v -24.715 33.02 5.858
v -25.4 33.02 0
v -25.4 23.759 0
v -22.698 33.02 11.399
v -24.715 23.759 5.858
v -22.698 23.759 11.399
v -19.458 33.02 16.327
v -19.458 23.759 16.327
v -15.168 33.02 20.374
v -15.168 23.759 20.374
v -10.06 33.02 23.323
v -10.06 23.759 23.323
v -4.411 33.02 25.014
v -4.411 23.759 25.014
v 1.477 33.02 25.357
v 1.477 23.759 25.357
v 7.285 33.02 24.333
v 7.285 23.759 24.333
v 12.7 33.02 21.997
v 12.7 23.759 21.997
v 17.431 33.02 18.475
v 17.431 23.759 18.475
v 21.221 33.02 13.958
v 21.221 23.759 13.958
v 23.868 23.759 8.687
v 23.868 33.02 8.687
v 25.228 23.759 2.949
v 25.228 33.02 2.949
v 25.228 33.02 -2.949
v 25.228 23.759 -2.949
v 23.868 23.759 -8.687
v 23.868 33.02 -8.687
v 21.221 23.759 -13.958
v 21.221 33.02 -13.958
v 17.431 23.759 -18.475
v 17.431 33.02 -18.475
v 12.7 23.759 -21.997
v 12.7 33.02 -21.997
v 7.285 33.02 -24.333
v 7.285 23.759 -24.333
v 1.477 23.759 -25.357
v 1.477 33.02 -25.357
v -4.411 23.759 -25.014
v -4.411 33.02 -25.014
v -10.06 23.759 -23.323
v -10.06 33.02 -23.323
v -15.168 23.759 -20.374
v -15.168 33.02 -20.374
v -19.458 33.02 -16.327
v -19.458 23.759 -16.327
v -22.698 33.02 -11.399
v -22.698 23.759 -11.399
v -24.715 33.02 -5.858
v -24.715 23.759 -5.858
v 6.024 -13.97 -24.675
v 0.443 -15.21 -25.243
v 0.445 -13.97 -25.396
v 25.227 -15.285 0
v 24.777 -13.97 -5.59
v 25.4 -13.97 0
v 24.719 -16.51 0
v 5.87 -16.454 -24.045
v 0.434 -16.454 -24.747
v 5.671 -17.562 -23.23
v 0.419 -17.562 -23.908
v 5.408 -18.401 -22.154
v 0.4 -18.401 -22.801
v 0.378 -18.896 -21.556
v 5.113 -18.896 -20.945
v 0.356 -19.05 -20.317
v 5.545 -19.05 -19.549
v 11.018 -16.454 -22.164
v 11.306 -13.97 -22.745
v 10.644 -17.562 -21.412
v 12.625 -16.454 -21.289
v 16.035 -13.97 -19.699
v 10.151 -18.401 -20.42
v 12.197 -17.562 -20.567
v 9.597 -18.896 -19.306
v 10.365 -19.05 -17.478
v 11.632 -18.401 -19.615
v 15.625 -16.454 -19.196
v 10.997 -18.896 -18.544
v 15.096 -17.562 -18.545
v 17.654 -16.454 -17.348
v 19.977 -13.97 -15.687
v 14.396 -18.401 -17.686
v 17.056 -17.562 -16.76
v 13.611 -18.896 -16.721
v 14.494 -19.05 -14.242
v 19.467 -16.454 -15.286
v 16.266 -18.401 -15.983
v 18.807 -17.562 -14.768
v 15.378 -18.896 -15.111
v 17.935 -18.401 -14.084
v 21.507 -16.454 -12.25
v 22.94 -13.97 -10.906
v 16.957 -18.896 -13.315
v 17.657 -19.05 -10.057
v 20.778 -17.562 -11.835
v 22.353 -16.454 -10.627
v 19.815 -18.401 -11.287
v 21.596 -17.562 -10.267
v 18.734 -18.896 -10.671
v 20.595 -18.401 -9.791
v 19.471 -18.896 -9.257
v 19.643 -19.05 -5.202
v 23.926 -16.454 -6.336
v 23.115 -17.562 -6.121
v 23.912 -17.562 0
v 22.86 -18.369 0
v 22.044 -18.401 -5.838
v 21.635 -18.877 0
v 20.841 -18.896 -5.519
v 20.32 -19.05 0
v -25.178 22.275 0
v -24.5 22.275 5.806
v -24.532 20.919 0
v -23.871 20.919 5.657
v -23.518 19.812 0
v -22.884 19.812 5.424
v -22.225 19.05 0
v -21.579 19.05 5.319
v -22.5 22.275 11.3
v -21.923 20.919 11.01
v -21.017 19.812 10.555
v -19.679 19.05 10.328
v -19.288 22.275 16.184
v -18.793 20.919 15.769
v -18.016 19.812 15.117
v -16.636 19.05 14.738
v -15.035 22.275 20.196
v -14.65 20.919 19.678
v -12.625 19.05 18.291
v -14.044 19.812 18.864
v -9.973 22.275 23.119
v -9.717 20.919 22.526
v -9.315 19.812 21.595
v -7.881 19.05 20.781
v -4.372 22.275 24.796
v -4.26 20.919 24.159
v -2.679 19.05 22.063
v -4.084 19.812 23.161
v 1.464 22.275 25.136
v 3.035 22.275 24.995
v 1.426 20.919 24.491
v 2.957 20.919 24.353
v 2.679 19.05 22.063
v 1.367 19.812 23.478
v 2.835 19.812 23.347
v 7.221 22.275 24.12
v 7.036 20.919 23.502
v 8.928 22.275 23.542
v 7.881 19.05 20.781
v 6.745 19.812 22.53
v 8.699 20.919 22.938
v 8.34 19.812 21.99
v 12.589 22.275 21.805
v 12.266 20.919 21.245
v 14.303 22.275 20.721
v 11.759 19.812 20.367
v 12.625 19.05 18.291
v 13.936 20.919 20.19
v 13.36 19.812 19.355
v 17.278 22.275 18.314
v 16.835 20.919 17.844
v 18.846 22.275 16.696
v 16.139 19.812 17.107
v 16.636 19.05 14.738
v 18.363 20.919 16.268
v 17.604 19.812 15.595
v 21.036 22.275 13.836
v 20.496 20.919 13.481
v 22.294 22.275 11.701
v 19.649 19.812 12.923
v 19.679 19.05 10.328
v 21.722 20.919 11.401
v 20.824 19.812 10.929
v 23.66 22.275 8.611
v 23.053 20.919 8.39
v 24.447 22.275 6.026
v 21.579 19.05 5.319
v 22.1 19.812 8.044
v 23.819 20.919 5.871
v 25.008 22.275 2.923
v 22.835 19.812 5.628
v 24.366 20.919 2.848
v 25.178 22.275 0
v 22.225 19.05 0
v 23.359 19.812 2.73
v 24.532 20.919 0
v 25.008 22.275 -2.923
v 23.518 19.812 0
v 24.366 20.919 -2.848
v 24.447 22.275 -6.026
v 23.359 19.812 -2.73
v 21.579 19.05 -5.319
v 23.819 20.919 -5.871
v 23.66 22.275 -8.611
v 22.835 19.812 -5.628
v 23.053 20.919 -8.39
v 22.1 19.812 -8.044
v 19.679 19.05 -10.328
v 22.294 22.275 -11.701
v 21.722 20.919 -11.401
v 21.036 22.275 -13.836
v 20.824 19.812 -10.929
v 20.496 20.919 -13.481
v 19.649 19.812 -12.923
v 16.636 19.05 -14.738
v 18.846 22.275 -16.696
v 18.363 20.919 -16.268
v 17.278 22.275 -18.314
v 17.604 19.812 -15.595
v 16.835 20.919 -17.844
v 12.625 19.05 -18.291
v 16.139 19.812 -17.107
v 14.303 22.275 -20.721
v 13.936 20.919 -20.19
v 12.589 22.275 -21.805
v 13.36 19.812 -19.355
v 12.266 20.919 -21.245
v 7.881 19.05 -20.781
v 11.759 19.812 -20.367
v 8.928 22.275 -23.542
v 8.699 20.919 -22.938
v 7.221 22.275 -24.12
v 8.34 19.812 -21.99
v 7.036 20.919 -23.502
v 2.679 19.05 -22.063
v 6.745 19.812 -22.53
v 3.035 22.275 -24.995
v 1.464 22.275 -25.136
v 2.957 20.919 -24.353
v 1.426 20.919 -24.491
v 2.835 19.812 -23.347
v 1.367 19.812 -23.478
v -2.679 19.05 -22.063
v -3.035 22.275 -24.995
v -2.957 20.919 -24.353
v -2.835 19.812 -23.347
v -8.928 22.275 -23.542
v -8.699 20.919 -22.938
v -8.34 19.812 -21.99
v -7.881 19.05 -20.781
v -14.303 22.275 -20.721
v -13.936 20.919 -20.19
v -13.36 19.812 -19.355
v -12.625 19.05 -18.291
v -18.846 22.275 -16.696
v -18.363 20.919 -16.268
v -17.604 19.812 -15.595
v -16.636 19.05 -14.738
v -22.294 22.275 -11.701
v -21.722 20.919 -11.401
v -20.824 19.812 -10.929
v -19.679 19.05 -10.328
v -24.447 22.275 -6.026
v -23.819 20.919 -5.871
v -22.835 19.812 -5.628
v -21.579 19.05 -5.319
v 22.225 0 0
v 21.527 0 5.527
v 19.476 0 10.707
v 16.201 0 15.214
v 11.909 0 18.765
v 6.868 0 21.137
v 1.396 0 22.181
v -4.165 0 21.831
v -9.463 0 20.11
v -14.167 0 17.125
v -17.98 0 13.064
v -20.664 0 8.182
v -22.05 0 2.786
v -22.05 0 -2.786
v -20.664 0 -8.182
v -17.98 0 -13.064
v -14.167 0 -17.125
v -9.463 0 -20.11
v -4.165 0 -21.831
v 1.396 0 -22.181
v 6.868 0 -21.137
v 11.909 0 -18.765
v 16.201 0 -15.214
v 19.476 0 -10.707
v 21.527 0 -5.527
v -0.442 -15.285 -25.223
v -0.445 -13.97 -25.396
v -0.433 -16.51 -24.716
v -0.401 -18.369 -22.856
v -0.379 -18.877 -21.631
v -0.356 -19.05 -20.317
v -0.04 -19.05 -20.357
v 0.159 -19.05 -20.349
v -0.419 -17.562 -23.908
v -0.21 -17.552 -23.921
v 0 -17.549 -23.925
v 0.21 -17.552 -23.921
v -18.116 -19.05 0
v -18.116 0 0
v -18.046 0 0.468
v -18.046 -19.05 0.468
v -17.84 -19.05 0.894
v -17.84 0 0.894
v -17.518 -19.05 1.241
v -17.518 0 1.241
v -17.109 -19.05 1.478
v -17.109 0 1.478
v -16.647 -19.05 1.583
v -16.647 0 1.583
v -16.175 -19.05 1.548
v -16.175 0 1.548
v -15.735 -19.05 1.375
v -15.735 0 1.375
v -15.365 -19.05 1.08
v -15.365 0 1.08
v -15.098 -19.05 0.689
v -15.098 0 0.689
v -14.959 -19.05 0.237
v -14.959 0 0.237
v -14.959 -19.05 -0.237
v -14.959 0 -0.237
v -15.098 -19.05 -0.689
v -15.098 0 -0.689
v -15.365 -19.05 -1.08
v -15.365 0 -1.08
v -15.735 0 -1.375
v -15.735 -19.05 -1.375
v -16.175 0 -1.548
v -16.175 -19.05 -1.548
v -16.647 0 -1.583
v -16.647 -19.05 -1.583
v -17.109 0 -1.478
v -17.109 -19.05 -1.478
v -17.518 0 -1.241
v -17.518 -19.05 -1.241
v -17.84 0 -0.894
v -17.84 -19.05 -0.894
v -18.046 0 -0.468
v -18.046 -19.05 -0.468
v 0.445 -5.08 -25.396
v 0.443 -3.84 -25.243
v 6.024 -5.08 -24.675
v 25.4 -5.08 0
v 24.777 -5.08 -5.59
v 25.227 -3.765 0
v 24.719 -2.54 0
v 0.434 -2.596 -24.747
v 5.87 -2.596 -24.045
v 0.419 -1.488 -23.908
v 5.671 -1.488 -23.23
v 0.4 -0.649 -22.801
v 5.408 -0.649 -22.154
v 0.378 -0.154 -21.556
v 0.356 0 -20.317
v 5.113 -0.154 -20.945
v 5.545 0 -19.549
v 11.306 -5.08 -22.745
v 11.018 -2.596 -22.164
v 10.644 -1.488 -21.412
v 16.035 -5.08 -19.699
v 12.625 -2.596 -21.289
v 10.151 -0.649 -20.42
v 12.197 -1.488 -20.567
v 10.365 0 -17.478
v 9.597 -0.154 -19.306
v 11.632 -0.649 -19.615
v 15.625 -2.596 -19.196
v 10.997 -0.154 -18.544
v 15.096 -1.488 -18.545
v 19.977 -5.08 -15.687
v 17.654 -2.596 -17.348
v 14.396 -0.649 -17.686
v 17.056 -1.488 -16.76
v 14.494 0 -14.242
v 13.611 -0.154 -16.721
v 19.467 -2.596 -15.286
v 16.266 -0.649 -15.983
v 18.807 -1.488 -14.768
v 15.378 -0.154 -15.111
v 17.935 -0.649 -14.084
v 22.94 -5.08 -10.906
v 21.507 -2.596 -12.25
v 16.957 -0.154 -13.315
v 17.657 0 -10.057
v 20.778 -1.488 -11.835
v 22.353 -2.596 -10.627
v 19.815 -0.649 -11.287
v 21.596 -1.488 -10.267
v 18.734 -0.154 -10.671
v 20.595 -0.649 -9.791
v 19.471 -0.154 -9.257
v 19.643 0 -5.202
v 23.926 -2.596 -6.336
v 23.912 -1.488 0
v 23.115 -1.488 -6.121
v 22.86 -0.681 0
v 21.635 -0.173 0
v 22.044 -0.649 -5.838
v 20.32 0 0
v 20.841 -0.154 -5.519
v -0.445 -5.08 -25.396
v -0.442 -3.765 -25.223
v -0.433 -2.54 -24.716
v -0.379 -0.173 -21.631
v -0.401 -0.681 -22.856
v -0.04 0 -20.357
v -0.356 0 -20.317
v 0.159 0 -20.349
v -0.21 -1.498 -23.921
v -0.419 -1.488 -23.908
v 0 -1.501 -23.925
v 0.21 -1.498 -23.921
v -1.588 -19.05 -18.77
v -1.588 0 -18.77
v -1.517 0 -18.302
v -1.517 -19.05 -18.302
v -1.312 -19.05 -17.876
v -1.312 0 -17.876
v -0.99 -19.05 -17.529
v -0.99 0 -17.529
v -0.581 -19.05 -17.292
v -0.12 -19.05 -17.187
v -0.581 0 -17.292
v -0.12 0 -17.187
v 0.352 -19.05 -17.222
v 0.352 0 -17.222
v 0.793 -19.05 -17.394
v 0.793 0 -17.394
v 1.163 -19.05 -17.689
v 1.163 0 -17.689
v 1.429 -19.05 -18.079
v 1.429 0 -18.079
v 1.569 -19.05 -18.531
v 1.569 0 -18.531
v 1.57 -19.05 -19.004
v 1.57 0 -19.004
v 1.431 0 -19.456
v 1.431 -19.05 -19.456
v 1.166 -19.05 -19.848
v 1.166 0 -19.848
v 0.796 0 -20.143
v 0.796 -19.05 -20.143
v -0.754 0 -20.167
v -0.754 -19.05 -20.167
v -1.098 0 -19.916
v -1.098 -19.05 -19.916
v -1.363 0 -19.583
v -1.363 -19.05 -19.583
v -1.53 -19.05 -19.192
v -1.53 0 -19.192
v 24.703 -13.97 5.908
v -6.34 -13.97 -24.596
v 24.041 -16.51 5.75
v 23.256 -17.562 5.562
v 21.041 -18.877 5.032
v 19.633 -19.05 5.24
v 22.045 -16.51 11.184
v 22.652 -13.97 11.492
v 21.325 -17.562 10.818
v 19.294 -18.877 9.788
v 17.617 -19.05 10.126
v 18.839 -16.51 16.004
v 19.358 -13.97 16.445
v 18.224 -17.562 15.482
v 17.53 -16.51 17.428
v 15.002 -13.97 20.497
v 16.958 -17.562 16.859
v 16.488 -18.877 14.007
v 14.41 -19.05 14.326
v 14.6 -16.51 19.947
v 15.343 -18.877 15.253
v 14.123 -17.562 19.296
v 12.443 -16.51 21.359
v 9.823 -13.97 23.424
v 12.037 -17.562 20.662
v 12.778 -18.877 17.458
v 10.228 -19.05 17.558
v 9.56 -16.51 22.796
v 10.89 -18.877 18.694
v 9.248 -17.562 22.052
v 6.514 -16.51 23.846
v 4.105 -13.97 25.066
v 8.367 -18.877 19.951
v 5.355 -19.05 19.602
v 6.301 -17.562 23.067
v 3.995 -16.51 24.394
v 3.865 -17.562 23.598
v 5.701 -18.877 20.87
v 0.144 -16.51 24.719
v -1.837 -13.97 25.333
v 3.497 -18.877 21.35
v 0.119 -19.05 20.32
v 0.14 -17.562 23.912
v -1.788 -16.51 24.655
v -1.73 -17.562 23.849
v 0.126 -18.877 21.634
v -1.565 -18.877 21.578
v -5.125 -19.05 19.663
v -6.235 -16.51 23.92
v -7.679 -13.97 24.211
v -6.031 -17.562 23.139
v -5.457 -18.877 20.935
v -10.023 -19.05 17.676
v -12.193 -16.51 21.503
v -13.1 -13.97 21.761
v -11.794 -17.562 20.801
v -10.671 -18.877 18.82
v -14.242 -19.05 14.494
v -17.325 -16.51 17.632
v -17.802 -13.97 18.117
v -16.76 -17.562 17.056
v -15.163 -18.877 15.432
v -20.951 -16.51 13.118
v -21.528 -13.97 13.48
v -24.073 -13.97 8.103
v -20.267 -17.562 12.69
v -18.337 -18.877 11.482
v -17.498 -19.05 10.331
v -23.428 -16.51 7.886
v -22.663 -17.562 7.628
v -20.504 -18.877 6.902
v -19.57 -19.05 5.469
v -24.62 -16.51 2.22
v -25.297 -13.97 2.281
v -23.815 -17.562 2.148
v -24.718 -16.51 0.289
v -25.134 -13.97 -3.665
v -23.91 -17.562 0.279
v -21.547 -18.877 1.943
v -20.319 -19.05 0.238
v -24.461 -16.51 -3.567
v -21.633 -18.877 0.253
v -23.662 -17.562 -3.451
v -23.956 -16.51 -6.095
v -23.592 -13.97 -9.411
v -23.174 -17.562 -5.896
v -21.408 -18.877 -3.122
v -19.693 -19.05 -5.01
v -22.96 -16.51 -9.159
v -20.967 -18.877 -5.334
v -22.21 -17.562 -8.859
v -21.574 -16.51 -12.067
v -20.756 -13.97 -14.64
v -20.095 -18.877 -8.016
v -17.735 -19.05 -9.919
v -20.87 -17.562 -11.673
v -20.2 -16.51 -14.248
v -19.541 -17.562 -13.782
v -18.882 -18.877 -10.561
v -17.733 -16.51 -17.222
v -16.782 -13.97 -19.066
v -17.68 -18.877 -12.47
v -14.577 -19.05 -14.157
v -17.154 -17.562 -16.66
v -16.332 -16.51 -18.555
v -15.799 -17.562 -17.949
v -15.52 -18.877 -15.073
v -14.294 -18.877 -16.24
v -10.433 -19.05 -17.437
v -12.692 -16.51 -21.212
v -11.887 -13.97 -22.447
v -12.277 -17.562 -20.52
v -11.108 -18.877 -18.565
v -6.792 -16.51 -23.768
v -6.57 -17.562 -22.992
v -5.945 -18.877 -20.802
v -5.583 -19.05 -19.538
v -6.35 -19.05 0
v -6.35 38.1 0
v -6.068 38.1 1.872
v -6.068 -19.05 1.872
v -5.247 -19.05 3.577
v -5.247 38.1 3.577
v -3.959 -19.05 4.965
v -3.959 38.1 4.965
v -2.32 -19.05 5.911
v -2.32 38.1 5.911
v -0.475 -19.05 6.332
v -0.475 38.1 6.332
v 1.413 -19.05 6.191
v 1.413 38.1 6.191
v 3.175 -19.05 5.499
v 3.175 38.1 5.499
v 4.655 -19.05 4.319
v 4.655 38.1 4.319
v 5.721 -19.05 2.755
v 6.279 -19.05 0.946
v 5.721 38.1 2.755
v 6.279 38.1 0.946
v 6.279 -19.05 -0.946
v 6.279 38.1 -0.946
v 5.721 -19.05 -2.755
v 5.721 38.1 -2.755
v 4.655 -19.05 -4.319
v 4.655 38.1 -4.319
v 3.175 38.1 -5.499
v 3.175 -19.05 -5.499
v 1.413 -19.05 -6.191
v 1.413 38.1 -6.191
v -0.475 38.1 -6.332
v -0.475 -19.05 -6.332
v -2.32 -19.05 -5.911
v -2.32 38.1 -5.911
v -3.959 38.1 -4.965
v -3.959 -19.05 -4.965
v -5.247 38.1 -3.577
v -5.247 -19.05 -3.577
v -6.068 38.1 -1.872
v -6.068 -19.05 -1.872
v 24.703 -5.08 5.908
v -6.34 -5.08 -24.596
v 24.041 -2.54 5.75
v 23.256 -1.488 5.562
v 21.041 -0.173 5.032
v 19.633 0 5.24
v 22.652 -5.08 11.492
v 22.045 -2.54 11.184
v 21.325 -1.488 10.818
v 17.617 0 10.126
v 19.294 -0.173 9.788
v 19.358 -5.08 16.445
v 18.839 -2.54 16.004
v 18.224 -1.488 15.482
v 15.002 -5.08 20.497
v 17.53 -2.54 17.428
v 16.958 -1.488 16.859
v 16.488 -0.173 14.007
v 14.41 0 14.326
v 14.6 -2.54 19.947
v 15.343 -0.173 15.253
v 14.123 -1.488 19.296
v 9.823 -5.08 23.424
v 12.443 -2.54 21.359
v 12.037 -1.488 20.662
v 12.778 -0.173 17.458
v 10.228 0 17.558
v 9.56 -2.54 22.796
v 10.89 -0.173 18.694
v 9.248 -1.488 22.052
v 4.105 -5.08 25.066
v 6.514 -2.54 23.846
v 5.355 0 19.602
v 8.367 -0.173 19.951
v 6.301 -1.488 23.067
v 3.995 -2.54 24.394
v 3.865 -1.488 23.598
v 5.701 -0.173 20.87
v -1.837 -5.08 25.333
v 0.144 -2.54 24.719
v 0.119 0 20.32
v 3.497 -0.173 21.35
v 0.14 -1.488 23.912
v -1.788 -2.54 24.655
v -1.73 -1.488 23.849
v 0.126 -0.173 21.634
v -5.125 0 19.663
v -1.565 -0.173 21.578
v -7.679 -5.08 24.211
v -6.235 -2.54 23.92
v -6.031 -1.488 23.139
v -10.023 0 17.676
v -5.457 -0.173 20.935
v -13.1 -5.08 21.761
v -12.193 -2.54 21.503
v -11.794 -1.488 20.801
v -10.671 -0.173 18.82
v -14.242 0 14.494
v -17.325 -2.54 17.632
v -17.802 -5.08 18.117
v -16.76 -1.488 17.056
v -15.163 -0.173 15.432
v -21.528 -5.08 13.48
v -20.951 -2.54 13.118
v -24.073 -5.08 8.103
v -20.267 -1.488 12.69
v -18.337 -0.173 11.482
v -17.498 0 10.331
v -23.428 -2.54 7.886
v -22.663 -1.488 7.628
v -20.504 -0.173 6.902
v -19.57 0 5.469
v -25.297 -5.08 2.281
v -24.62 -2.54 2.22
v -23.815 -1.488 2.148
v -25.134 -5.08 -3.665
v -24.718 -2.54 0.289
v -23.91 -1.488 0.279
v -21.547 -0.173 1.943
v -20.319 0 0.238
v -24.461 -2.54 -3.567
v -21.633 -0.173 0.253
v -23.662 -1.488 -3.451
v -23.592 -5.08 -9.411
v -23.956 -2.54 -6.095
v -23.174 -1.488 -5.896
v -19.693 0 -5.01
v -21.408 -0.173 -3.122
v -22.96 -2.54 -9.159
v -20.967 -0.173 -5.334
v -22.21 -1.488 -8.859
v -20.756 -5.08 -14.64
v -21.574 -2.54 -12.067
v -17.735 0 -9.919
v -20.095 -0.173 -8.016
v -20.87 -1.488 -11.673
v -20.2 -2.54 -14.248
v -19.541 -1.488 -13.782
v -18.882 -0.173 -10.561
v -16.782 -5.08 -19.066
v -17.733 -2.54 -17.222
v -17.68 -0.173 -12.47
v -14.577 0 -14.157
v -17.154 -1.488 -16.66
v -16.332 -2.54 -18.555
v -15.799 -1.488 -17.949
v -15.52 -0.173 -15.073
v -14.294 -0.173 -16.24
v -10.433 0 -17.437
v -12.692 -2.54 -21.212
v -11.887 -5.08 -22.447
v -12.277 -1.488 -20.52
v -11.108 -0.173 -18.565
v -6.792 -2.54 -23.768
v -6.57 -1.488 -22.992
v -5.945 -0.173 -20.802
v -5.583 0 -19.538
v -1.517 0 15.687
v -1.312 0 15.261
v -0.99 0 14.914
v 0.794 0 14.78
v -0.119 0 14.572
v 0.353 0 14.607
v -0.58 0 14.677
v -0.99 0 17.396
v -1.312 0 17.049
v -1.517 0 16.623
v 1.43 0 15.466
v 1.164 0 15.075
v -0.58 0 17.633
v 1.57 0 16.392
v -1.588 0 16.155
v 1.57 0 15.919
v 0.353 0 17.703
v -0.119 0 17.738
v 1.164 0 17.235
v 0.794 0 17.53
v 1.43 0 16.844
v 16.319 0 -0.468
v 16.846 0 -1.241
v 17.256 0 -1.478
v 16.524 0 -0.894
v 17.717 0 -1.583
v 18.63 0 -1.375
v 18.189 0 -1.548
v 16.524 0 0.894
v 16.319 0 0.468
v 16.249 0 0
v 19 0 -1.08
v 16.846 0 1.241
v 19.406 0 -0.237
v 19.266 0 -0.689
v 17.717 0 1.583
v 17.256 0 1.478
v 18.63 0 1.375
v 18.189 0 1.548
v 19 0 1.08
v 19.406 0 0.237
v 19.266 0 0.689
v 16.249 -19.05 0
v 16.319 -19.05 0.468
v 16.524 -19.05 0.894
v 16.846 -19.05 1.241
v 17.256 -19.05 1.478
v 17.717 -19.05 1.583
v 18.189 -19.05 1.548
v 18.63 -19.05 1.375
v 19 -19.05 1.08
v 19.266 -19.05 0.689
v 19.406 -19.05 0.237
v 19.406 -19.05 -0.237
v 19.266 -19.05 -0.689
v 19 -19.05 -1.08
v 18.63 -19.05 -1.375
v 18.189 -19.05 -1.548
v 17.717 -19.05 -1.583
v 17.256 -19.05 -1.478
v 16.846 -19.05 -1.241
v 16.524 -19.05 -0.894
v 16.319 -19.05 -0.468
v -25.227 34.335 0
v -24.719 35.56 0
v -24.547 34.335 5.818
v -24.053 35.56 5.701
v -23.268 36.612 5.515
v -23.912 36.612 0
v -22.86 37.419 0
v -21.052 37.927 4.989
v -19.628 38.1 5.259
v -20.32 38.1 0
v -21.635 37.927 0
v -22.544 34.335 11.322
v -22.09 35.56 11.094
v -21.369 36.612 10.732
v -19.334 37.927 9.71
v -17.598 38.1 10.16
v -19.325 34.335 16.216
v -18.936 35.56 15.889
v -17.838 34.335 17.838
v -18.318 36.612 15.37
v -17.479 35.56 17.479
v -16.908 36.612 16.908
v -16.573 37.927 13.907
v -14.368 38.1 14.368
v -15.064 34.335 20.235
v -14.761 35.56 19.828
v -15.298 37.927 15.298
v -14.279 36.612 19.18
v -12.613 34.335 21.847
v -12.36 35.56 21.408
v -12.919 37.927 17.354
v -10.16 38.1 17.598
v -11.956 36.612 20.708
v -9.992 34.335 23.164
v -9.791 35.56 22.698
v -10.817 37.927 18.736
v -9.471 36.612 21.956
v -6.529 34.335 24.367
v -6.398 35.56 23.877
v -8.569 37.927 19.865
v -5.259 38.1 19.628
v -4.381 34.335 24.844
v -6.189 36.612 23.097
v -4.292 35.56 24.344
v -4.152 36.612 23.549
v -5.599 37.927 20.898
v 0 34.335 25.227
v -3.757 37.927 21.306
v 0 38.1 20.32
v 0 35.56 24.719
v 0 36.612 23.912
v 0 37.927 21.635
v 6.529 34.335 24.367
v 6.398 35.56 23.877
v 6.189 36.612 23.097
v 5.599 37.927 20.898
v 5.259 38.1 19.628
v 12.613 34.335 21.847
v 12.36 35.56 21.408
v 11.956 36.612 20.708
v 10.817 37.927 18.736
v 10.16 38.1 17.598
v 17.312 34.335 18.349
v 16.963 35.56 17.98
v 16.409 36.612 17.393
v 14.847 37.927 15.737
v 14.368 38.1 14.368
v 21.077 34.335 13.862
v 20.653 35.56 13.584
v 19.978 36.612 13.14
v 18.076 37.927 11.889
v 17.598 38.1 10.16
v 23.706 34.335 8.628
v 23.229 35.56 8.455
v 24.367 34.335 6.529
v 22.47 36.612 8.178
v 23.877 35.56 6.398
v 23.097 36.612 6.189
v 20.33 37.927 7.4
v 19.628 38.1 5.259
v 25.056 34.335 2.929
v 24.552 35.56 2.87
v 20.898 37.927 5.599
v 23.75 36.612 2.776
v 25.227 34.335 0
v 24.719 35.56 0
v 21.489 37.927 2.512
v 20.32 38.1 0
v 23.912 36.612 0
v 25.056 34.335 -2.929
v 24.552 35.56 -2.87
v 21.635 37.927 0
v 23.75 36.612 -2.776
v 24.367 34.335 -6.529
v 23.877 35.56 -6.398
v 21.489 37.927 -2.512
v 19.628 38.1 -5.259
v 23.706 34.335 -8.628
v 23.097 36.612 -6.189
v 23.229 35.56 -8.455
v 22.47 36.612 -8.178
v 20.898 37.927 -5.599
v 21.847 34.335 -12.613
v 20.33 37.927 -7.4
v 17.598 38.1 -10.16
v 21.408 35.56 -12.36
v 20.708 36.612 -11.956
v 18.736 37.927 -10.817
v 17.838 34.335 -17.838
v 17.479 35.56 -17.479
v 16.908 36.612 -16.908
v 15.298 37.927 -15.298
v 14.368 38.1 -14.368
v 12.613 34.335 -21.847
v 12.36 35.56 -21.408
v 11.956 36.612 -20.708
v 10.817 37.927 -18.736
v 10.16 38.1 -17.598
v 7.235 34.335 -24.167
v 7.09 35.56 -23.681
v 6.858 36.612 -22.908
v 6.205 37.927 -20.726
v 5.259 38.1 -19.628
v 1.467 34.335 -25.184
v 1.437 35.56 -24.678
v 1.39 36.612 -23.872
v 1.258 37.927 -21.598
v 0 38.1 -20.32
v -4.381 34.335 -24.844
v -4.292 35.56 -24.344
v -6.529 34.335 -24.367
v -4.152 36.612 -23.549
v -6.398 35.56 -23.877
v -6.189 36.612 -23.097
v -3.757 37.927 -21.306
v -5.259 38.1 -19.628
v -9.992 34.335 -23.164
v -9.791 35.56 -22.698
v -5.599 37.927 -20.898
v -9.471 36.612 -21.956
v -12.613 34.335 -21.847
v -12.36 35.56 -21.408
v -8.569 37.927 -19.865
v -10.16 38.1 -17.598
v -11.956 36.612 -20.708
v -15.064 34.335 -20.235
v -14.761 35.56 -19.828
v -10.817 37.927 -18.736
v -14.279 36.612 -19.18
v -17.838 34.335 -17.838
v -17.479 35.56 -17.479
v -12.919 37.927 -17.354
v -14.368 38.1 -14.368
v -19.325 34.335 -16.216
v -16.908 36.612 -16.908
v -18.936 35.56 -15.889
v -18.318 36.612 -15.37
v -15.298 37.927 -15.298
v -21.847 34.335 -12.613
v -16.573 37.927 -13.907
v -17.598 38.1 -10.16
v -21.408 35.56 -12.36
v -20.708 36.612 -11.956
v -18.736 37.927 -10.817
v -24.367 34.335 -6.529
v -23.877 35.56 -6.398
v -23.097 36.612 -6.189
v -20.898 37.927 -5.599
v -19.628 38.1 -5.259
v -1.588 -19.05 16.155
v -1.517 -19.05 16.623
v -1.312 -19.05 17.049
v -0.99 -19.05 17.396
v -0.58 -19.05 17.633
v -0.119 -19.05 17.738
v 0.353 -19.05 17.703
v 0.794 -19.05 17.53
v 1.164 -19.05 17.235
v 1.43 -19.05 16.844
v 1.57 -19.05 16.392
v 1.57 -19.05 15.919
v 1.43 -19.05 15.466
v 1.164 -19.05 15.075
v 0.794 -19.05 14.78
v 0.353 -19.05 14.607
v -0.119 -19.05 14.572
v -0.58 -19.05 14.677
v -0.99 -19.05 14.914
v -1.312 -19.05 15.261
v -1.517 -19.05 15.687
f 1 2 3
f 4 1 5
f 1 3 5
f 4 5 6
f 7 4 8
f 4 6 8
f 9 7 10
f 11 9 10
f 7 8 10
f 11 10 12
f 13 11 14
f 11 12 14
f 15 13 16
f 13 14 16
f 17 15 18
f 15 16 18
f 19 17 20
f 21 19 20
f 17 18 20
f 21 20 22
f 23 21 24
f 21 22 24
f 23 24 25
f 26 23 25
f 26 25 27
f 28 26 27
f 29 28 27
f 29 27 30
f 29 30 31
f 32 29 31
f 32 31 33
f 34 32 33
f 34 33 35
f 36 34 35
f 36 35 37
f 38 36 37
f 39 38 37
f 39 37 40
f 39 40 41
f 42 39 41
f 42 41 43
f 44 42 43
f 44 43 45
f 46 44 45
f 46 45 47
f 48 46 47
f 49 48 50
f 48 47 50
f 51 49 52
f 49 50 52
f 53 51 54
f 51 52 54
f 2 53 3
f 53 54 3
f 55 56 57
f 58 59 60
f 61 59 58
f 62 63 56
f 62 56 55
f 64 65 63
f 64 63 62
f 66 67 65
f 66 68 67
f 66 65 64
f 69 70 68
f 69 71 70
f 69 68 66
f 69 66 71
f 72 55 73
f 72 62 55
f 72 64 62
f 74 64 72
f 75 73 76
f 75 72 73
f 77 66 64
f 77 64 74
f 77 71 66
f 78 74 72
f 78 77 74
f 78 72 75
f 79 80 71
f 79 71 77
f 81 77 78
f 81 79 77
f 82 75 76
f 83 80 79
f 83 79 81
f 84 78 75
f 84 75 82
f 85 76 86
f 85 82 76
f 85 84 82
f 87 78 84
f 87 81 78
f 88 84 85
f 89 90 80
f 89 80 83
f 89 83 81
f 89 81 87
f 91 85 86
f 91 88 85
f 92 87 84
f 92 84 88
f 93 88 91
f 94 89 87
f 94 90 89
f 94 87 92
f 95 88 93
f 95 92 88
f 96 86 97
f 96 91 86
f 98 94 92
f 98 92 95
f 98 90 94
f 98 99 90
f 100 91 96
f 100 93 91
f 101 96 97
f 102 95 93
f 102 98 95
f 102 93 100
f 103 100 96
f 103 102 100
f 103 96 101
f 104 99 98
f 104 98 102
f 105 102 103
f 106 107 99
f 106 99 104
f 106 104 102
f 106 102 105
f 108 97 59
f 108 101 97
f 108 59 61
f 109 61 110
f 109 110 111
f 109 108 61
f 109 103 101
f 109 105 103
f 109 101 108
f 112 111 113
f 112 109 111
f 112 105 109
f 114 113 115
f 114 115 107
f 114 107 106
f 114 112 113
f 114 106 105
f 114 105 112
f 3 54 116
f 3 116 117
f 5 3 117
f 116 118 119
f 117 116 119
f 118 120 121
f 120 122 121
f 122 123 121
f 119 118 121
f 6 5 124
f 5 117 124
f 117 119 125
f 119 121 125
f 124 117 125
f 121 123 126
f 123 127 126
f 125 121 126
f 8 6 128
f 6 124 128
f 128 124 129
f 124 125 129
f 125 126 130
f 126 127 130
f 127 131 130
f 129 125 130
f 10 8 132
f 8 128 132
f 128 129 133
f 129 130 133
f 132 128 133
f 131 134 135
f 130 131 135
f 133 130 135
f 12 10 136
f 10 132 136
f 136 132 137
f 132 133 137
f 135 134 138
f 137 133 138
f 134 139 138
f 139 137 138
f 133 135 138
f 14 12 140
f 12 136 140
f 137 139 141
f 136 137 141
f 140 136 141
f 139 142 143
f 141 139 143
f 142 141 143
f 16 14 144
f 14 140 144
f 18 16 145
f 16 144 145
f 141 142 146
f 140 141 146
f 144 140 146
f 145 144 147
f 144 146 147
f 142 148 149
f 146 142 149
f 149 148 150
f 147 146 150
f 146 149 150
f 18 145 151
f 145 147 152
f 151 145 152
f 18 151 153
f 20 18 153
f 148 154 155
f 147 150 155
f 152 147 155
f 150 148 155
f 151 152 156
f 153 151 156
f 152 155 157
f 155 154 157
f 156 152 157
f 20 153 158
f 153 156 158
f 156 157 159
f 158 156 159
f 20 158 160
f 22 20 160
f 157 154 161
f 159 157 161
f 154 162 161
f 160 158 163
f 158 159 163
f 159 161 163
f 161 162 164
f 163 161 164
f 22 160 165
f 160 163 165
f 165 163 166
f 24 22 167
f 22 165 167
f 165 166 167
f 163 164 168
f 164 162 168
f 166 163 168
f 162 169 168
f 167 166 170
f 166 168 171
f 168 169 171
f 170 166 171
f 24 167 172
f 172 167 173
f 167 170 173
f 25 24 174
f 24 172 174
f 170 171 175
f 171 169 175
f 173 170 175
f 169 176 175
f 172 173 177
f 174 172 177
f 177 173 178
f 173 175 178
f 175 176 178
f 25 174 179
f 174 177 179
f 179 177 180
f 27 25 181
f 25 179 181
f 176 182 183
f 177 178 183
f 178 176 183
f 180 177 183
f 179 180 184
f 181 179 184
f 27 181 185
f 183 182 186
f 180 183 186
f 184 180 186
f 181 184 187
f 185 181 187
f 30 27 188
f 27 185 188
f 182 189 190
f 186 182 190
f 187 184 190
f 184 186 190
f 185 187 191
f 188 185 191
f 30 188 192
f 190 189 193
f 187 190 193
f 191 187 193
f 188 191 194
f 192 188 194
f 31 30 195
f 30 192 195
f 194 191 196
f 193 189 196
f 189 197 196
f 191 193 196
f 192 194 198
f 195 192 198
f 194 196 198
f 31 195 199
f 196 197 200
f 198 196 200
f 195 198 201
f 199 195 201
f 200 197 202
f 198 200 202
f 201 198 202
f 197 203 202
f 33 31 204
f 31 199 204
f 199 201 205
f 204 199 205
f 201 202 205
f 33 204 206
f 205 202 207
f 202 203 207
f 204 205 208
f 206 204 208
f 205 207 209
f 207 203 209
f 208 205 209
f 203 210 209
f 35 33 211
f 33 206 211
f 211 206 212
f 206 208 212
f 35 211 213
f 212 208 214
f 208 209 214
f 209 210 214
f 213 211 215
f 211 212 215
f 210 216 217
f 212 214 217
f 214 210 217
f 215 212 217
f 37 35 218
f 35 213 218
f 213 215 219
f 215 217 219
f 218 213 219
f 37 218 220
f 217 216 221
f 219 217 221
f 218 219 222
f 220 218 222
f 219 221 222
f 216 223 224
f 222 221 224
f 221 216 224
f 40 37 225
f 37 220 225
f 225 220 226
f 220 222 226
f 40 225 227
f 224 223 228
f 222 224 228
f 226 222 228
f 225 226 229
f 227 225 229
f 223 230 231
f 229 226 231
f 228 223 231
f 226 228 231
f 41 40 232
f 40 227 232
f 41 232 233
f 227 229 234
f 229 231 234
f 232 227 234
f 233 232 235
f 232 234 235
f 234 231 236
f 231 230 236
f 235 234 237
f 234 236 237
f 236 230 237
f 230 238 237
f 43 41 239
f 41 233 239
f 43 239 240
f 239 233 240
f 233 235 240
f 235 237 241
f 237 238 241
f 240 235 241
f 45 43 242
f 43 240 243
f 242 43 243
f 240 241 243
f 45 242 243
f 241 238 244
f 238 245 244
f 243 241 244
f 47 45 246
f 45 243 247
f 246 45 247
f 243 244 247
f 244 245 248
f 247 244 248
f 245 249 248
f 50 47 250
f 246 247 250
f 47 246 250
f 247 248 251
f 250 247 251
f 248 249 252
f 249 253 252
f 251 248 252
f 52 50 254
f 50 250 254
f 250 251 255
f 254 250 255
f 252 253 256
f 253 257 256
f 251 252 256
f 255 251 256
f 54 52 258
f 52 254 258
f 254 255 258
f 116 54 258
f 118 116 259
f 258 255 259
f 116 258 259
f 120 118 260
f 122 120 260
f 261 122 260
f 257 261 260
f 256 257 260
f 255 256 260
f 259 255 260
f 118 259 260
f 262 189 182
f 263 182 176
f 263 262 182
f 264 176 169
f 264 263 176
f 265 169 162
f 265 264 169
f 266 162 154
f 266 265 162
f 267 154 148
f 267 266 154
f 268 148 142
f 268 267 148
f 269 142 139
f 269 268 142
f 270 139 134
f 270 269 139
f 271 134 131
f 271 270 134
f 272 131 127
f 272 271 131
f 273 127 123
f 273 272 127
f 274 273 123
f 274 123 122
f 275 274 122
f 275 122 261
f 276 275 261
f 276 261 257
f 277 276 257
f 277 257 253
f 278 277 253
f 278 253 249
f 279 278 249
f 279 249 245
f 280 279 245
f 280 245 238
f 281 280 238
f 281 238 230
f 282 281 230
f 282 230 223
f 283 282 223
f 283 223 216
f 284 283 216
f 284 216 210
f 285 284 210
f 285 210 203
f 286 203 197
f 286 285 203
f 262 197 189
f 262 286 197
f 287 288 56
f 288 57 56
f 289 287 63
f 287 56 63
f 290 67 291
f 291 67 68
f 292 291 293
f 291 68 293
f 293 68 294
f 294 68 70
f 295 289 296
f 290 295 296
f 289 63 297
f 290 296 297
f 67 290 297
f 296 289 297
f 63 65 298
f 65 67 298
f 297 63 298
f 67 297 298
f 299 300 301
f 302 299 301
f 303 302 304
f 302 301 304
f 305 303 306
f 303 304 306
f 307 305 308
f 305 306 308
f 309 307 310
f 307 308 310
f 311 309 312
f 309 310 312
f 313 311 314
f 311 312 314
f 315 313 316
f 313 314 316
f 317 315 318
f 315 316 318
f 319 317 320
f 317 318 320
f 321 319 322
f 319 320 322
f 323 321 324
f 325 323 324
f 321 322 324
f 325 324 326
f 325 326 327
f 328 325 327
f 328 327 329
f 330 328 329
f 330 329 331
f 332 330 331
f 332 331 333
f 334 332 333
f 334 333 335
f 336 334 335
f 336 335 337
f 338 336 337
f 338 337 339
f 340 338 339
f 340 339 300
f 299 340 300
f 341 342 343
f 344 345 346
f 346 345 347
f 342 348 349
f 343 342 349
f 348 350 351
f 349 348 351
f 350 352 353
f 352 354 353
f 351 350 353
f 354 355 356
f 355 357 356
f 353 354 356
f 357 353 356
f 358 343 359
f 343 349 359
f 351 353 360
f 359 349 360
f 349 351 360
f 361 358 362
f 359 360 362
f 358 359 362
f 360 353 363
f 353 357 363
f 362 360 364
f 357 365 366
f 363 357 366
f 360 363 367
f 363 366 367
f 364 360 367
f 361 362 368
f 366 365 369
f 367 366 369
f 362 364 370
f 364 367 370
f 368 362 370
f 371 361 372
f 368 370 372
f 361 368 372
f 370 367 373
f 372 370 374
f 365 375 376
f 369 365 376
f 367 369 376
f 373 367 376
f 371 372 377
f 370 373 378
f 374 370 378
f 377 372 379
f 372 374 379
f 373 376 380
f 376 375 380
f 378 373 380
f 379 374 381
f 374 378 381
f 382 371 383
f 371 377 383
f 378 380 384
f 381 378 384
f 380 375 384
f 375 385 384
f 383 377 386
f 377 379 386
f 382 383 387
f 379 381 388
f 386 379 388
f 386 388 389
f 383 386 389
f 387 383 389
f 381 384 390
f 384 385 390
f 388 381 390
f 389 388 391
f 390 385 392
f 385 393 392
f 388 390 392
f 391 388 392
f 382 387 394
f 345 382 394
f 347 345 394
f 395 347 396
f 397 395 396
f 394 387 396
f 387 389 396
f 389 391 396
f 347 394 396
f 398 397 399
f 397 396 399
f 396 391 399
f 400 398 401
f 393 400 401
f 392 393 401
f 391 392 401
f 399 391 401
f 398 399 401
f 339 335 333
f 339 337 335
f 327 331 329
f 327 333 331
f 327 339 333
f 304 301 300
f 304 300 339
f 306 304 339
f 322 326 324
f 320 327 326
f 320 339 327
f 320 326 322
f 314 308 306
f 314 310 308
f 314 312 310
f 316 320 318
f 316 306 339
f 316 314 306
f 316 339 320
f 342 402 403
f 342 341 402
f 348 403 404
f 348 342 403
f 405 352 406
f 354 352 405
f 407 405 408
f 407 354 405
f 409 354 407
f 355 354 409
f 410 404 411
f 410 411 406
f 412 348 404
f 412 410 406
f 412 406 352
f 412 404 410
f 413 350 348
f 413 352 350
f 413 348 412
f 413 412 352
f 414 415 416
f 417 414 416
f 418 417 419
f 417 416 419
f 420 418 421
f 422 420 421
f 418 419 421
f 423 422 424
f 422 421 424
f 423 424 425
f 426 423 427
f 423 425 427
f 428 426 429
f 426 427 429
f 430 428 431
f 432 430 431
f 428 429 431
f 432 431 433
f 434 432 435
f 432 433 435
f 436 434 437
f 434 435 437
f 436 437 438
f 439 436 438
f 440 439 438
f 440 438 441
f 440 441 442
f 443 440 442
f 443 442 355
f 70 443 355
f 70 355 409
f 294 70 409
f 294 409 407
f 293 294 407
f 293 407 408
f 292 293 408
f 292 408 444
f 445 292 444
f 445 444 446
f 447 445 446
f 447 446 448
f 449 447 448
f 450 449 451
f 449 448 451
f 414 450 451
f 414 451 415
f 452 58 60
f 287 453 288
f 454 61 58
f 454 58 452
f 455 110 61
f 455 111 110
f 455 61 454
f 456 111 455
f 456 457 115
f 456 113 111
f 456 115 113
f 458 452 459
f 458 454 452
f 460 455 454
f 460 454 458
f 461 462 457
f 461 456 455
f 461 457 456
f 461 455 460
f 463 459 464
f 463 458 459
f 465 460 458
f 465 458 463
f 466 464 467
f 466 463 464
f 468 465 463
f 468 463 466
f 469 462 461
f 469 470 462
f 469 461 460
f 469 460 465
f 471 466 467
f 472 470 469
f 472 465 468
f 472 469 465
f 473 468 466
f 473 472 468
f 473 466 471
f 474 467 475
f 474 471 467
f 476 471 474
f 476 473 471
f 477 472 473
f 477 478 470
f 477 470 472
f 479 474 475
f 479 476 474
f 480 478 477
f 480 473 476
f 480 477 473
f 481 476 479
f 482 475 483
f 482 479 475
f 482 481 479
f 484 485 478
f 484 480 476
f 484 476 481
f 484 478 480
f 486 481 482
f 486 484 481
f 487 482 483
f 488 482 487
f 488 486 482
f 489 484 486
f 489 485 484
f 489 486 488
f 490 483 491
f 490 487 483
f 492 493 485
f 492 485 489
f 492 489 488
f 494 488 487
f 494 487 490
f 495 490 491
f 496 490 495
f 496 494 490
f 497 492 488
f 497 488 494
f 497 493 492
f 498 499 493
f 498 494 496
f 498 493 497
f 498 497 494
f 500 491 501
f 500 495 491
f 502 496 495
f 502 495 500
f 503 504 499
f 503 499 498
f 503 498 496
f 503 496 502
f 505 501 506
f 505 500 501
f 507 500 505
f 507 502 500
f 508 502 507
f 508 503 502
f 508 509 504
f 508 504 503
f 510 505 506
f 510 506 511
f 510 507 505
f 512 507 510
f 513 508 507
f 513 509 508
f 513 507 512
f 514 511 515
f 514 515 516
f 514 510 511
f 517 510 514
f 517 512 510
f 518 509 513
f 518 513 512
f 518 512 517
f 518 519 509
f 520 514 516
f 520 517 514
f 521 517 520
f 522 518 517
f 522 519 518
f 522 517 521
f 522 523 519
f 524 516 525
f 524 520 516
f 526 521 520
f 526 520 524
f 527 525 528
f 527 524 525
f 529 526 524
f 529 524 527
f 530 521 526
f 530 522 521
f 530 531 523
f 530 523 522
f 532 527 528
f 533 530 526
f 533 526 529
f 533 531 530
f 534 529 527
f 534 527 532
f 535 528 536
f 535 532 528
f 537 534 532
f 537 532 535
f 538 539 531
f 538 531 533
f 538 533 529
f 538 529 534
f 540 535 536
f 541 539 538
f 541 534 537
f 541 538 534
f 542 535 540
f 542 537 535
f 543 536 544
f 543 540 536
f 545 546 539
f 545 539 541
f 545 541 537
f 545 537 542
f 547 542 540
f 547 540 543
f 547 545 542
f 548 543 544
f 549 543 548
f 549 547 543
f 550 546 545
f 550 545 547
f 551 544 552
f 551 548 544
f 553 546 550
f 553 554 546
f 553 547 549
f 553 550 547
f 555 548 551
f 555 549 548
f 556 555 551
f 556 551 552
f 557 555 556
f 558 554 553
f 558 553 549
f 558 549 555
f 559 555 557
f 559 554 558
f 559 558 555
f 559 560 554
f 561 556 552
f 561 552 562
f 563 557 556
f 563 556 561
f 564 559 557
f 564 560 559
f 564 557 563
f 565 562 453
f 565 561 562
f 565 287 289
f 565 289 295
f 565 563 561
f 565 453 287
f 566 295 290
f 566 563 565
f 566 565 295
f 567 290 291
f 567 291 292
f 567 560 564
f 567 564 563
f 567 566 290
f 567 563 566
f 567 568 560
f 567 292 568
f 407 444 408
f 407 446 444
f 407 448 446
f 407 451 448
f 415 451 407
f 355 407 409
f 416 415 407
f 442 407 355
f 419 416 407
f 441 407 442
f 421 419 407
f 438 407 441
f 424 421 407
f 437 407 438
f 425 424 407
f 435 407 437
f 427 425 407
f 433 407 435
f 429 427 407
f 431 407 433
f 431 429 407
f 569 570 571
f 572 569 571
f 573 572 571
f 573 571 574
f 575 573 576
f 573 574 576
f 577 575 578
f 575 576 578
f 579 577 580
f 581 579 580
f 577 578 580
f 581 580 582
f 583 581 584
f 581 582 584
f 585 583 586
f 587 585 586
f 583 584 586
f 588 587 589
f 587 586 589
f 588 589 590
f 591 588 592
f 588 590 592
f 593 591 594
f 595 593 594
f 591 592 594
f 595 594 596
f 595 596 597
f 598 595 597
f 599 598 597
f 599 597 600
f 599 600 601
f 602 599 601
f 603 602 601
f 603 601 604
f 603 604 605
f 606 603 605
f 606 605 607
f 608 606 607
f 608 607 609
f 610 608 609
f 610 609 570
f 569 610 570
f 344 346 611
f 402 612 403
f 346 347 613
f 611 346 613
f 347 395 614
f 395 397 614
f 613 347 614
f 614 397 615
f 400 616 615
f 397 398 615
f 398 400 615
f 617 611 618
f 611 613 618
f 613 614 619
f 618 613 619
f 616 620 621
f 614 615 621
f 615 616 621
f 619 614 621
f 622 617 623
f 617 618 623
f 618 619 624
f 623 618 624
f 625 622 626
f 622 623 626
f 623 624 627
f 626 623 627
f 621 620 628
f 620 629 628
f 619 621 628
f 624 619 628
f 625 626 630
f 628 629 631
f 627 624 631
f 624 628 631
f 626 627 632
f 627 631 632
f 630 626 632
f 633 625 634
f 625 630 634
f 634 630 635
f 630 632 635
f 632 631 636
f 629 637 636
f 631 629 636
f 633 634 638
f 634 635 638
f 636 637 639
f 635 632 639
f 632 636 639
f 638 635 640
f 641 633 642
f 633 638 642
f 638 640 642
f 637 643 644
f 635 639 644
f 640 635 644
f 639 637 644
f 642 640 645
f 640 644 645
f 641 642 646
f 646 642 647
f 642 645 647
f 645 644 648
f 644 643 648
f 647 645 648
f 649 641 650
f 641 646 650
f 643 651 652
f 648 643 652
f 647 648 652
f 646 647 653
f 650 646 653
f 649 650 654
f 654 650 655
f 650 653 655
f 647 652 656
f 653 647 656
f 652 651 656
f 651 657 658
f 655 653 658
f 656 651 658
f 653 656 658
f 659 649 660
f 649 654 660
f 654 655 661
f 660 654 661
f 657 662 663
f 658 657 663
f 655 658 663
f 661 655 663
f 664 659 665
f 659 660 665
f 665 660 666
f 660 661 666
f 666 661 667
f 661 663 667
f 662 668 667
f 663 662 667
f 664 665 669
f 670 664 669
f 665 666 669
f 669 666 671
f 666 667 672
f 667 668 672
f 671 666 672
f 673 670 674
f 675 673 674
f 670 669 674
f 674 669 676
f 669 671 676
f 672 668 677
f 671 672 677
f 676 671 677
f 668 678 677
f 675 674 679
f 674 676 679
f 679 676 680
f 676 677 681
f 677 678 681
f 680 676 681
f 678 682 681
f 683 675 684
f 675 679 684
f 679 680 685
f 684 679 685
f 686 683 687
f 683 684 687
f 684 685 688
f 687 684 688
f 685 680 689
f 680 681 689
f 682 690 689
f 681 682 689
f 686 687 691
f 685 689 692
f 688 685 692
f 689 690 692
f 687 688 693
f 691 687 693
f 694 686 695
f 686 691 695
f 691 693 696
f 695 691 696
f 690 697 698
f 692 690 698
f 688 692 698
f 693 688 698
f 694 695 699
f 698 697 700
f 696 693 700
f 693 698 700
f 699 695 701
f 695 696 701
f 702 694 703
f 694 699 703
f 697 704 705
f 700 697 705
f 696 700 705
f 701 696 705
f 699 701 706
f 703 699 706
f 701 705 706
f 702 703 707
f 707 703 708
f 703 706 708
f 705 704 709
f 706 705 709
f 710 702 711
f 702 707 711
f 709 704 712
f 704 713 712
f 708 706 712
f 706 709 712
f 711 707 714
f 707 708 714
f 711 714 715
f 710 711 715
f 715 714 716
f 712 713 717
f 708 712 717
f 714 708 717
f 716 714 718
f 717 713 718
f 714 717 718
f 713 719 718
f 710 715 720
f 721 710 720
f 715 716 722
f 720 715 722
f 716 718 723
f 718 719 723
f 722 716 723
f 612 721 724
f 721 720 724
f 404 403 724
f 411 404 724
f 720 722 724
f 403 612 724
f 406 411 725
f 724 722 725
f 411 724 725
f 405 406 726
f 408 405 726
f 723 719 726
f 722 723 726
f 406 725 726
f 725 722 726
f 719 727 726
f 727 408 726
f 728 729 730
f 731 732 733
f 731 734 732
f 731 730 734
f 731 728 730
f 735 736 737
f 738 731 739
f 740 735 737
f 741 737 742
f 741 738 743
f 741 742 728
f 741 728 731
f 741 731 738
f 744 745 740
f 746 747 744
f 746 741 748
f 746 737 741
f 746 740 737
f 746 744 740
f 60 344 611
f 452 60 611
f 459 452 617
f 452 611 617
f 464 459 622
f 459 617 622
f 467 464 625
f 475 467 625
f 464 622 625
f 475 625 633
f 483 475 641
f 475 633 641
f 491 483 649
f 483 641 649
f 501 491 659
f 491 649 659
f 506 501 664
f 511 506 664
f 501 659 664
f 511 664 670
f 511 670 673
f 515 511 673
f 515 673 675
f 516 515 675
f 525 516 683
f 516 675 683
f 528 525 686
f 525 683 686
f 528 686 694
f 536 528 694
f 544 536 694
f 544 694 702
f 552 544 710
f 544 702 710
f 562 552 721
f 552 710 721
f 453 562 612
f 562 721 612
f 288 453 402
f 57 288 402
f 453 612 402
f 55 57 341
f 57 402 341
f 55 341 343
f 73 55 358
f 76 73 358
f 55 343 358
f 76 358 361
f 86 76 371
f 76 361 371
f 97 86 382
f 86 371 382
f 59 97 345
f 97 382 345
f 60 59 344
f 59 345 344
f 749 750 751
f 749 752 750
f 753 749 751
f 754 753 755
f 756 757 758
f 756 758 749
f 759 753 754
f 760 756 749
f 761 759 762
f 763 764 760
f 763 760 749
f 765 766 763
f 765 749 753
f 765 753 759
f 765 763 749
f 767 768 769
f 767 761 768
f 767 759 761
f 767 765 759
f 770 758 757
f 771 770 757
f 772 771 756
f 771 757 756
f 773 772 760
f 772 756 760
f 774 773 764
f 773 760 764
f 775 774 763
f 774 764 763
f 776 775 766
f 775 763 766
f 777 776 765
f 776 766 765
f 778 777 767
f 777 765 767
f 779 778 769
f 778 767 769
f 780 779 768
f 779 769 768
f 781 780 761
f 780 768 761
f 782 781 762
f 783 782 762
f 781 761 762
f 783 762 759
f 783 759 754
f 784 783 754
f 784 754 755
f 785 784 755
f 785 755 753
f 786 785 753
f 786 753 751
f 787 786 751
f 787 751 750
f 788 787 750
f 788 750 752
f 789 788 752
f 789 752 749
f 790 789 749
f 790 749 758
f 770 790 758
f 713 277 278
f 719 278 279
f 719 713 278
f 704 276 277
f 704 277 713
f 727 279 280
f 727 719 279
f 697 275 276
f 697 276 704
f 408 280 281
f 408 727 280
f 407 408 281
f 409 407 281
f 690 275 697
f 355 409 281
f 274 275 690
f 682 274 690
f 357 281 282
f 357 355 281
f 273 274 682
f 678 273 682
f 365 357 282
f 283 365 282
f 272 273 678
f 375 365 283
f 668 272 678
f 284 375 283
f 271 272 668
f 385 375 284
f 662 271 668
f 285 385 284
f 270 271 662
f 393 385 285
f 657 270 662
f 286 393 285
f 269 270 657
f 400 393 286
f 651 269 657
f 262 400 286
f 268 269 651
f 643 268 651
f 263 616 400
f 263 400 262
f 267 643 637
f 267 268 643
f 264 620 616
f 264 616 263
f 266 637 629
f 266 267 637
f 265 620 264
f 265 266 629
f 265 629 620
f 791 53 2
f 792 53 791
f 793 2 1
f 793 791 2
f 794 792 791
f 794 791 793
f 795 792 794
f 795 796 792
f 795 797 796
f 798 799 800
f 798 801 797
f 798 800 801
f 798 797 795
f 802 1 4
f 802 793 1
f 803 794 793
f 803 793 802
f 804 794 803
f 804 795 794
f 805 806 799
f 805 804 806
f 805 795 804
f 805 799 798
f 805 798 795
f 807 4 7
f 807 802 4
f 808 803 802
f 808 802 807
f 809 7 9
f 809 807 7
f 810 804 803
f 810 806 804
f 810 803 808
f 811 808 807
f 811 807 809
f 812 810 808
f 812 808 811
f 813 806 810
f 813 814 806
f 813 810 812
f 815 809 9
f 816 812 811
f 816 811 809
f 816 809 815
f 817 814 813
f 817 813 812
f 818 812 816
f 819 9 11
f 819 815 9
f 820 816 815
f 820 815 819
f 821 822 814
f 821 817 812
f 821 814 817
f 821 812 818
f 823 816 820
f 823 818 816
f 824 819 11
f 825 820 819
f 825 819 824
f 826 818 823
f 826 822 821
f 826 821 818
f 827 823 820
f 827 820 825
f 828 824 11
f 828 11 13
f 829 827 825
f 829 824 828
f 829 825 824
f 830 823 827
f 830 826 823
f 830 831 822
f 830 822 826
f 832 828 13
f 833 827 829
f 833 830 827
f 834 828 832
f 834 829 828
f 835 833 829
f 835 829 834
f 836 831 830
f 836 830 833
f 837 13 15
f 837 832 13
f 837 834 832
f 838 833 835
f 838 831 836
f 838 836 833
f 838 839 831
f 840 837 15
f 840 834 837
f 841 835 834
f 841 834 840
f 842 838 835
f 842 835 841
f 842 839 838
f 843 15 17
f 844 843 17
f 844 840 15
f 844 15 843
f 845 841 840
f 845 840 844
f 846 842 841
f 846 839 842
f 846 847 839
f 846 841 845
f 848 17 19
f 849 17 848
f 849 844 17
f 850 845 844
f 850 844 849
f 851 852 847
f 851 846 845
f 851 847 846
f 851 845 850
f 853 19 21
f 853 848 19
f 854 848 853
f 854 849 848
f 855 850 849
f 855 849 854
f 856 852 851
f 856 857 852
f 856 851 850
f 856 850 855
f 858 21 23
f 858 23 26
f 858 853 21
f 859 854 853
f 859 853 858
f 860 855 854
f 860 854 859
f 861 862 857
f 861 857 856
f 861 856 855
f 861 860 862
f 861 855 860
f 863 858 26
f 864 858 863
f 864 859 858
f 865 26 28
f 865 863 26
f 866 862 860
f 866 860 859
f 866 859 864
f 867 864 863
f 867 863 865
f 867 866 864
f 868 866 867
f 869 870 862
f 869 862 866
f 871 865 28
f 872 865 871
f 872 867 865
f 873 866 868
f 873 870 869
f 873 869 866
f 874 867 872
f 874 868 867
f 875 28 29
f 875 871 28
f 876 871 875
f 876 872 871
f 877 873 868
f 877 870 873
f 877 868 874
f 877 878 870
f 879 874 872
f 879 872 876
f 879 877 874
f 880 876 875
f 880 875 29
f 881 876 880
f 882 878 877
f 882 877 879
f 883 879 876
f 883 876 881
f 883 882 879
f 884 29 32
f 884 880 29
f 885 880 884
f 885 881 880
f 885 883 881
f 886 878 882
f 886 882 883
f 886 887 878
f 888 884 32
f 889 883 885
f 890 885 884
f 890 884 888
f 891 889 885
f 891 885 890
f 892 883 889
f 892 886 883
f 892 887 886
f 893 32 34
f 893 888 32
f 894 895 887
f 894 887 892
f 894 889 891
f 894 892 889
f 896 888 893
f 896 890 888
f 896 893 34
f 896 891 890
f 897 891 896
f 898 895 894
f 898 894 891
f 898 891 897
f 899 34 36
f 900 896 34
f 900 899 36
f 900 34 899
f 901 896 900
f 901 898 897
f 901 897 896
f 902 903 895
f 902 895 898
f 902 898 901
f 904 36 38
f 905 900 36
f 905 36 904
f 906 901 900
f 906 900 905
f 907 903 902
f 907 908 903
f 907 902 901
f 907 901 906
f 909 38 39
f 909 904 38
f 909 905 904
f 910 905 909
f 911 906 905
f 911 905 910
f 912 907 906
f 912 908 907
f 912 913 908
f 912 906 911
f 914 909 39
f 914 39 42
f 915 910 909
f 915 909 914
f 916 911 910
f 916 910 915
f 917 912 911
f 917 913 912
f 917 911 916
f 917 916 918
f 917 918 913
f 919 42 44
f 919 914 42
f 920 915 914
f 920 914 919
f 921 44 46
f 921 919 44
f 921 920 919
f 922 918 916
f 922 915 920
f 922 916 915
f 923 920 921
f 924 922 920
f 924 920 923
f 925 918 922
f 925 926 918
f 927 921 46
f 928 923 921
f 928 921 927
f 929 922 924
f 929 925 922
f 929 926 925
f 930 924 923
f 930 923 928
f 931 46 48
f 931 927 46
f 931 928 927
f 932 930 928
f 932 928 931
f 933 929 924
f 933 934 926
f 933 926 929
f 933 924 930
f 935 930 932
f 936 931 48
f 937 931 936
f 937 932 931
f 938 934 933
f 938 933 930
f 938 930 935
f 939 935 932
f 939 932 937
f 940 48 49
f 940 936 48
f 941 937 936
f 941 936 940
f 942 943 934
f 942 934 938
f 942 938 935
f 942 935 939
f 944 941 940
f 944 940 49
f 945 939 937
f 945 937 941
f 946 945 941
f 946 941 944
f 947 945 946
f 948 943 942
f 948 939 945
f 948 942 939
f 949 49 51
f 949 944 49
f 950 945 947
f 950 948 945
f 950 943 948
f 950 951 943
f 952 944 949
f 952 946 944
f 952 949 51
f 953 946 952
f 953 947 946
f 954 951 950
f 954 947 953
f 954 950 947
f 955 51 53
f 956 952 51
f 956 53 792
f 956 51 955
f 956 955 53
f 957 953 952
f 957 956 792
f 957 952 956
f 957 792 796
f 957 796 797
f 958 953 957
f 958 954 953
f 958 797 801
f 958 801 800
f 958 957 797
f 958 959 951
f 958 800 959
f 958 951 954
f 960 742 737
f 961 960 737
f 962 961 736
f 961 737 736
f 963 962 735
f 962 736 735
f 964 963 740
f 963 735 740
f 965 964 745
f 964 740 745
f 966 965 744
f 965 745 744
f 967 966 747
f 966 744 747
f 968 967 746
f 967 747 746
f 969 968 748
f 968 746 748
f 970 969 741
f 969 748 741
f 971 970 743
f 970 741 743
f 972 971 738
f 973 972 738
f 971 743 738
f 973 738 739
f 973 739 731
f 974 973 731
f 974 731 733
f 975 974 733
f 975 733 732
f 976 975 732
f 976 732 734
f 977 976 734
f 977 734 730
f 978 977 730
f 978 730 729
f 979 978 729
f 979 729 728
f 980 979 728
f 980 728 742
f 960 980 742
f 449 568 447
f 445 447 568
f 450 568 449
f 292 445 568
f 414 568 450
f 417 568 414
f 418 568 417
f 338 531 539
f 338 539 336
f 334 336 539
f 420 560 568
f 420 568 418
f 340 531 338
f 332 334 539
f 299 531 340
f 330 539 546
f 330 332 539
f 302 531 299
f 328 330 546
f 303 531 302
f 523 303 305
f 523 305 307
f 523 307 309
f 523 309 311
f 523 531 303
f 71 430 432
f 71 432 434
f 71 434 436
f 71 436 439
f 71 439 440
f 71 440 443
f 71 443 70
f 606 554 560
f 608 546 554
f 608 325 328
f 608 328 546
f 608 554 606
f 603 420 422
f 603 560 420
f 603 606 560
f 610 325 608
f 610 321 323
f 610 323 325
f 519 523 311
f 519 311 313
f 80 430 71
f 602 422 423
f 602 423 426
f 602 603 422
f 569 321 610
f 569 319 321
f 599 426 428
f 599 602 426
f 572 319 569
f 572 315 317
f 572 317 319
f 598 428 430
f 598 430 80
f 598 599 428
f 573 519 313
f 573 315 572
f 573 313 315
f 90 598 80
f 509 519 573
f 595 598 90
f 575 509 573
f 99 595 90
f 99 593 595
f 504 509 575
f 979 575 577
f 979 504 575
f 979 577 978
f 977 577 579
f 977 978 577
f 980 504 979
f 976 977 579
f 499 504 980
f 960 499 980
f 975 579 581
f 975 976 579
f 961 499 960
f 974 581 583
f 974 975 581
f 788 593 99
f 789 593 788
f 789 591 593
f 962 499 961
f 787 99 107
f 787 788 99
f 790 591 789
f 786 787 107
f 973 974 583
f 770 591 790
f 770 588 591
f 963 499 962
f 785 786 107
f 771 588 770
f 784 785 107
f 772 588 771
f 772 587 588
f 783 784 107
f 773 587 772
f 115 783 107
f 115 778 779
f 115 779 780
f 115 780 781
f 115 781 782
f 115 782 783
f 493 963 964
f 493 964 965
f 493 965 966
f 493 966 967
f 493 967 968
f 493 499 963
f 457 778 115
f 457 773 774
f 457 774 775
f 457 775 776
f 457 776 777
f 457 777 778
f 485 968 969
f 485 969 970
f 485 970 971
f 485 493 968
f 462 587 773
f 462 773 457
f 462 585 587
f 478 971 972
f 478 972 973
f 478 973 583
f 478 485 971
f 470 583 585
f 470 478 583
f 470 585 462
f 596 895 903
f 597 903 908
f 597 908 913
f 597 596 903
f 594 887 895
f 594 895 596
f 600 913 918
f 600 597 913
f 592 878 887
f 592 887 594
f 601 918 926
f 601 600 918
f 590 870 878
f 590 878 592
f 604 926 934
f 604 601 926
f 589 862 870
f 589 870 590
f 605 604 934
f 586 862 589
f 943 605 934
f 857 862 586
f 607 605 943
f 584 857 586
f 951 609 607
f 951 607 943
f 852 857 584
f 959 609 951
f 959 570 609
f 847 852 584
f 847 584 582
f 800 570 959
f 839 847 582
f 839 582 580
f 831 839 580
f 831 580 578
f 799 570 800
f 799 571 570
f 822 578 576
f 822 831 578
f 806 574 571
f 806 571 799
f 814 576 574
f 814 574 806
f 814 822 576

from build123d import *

# Parameters (mm, degrees)
F0_R      = 25.4
F1_DEPTH  = 19.05
F2_R      = 1.5875
F3_DEPTH  = 44.45
F4_R      = 5.08
F5_R      = 22.225
F6_DEPTH  = 19.05
F7_R      = 25.4
F8_DEPTH  = 19.05
F10_R     = 6.35
F11_DEPTH = 57.1510001


# Not quite as in the source:
# - a fillet or chamfer that OpenCascade refuses, or shapes differently, is made with other operations: its cross-section is extruded or revolved along the edge and cut away or added


with BuildPart() as f1:
    # F0 (on Front) → F1 (new body)
    with BuildSketch(Plane.XZ):
        Circle(F0_R)
    extrude(amount=F1_DEPTH)

    # F2 (on face) → F3 (cut)
    with BuildSketch(Plane(origin=(0, 0, 0), x_dir=(-1, 0, 0), z_dir=(0, 1, 0))):
        with Locations((0, 16.1551559669)):
            Circle(F2_R)
        with Locations((16.5286865403, 0)):
            Circle(F2_R)
        with Locations((0, -18.7698644697)):
            Circle(F2_R)
        with Locations((-17.8360380362, 0)):
            Circle(F2_R)
    extrude(amount=-F3_DEPTH, mode=Mode.SUBTRACT)

    # F4
    f4_edges = [f1.edges().sort_by_distance(p)[0] for p in [
        (-25.4, 0, 0),
        (-25.4, -19.05, 0),
    ]]
    fillet(f4_edges, radius=F4_R)

    # F5 (on Front) → F6 (join)
    with BuildSketch(Plane.XZ):
        Circle(F5_R)
    extrude(amount=-F6_DEPTH)

    # F7 (on face) → F8 (join)
    with BuildSketch(Plane(origin=(0, 19.05, 0), x_dir=(-1, 0, 0), z_dir=(0, 1, 0))):
        Circle(F7_R)
    extrude(amount=F8_DEPTH)

    # F9: fillet of radius 5.08 on 2 edges, made by hand

    # F9_s1 → F9_t2 (revolve, cut)
    with BuildSketch(Plane.XY):
        with BuildLine():
            ThreePointArc((-25.4, 33.02), (-23.9121024484, 36.6121024484), (-20.32, 38.1))
            Line((-20.32, 38.1), (-25.4, 38.1))
            Line((-25.4, 38.1), (-25.4, 33.02))
        make_face()
    revolve(axis=Axis((0, 38.1, 0), (0, 1, 0)), mode=Mode.SUBTRACT)

    # F9_s3 → F9_t4 (revolve, cut)
    with BuildSketch(Plane.XY):
        with BuildLine():
            ThreePointArc((-25.4, 23.7592860393), (-24.5321134838, 20.9194797079), (-22.225, 19.05))
            Line((-22.225, 19.05), (-25.4, 19.05))
            Line((-25.4, 19.05), (-25.4, 23.7592860393))
        make_face()
    revolve(axis=Axis((0, 19.05, 0), (0, 1, 0)), mode=Mode.SUBTRACT)

    # F10 (on face) → F11 (cut, through all)
    with BuildSketch(Plane(origin=(0, 38.1, 0), x_dir=(-1, 0, 0), z_dir=(0, 1, 0))):
        Circle(F10_R)
    extrude(amount=-F11_DEPTH, mode=Mode.SUBTRACT)


solid = f1.part
